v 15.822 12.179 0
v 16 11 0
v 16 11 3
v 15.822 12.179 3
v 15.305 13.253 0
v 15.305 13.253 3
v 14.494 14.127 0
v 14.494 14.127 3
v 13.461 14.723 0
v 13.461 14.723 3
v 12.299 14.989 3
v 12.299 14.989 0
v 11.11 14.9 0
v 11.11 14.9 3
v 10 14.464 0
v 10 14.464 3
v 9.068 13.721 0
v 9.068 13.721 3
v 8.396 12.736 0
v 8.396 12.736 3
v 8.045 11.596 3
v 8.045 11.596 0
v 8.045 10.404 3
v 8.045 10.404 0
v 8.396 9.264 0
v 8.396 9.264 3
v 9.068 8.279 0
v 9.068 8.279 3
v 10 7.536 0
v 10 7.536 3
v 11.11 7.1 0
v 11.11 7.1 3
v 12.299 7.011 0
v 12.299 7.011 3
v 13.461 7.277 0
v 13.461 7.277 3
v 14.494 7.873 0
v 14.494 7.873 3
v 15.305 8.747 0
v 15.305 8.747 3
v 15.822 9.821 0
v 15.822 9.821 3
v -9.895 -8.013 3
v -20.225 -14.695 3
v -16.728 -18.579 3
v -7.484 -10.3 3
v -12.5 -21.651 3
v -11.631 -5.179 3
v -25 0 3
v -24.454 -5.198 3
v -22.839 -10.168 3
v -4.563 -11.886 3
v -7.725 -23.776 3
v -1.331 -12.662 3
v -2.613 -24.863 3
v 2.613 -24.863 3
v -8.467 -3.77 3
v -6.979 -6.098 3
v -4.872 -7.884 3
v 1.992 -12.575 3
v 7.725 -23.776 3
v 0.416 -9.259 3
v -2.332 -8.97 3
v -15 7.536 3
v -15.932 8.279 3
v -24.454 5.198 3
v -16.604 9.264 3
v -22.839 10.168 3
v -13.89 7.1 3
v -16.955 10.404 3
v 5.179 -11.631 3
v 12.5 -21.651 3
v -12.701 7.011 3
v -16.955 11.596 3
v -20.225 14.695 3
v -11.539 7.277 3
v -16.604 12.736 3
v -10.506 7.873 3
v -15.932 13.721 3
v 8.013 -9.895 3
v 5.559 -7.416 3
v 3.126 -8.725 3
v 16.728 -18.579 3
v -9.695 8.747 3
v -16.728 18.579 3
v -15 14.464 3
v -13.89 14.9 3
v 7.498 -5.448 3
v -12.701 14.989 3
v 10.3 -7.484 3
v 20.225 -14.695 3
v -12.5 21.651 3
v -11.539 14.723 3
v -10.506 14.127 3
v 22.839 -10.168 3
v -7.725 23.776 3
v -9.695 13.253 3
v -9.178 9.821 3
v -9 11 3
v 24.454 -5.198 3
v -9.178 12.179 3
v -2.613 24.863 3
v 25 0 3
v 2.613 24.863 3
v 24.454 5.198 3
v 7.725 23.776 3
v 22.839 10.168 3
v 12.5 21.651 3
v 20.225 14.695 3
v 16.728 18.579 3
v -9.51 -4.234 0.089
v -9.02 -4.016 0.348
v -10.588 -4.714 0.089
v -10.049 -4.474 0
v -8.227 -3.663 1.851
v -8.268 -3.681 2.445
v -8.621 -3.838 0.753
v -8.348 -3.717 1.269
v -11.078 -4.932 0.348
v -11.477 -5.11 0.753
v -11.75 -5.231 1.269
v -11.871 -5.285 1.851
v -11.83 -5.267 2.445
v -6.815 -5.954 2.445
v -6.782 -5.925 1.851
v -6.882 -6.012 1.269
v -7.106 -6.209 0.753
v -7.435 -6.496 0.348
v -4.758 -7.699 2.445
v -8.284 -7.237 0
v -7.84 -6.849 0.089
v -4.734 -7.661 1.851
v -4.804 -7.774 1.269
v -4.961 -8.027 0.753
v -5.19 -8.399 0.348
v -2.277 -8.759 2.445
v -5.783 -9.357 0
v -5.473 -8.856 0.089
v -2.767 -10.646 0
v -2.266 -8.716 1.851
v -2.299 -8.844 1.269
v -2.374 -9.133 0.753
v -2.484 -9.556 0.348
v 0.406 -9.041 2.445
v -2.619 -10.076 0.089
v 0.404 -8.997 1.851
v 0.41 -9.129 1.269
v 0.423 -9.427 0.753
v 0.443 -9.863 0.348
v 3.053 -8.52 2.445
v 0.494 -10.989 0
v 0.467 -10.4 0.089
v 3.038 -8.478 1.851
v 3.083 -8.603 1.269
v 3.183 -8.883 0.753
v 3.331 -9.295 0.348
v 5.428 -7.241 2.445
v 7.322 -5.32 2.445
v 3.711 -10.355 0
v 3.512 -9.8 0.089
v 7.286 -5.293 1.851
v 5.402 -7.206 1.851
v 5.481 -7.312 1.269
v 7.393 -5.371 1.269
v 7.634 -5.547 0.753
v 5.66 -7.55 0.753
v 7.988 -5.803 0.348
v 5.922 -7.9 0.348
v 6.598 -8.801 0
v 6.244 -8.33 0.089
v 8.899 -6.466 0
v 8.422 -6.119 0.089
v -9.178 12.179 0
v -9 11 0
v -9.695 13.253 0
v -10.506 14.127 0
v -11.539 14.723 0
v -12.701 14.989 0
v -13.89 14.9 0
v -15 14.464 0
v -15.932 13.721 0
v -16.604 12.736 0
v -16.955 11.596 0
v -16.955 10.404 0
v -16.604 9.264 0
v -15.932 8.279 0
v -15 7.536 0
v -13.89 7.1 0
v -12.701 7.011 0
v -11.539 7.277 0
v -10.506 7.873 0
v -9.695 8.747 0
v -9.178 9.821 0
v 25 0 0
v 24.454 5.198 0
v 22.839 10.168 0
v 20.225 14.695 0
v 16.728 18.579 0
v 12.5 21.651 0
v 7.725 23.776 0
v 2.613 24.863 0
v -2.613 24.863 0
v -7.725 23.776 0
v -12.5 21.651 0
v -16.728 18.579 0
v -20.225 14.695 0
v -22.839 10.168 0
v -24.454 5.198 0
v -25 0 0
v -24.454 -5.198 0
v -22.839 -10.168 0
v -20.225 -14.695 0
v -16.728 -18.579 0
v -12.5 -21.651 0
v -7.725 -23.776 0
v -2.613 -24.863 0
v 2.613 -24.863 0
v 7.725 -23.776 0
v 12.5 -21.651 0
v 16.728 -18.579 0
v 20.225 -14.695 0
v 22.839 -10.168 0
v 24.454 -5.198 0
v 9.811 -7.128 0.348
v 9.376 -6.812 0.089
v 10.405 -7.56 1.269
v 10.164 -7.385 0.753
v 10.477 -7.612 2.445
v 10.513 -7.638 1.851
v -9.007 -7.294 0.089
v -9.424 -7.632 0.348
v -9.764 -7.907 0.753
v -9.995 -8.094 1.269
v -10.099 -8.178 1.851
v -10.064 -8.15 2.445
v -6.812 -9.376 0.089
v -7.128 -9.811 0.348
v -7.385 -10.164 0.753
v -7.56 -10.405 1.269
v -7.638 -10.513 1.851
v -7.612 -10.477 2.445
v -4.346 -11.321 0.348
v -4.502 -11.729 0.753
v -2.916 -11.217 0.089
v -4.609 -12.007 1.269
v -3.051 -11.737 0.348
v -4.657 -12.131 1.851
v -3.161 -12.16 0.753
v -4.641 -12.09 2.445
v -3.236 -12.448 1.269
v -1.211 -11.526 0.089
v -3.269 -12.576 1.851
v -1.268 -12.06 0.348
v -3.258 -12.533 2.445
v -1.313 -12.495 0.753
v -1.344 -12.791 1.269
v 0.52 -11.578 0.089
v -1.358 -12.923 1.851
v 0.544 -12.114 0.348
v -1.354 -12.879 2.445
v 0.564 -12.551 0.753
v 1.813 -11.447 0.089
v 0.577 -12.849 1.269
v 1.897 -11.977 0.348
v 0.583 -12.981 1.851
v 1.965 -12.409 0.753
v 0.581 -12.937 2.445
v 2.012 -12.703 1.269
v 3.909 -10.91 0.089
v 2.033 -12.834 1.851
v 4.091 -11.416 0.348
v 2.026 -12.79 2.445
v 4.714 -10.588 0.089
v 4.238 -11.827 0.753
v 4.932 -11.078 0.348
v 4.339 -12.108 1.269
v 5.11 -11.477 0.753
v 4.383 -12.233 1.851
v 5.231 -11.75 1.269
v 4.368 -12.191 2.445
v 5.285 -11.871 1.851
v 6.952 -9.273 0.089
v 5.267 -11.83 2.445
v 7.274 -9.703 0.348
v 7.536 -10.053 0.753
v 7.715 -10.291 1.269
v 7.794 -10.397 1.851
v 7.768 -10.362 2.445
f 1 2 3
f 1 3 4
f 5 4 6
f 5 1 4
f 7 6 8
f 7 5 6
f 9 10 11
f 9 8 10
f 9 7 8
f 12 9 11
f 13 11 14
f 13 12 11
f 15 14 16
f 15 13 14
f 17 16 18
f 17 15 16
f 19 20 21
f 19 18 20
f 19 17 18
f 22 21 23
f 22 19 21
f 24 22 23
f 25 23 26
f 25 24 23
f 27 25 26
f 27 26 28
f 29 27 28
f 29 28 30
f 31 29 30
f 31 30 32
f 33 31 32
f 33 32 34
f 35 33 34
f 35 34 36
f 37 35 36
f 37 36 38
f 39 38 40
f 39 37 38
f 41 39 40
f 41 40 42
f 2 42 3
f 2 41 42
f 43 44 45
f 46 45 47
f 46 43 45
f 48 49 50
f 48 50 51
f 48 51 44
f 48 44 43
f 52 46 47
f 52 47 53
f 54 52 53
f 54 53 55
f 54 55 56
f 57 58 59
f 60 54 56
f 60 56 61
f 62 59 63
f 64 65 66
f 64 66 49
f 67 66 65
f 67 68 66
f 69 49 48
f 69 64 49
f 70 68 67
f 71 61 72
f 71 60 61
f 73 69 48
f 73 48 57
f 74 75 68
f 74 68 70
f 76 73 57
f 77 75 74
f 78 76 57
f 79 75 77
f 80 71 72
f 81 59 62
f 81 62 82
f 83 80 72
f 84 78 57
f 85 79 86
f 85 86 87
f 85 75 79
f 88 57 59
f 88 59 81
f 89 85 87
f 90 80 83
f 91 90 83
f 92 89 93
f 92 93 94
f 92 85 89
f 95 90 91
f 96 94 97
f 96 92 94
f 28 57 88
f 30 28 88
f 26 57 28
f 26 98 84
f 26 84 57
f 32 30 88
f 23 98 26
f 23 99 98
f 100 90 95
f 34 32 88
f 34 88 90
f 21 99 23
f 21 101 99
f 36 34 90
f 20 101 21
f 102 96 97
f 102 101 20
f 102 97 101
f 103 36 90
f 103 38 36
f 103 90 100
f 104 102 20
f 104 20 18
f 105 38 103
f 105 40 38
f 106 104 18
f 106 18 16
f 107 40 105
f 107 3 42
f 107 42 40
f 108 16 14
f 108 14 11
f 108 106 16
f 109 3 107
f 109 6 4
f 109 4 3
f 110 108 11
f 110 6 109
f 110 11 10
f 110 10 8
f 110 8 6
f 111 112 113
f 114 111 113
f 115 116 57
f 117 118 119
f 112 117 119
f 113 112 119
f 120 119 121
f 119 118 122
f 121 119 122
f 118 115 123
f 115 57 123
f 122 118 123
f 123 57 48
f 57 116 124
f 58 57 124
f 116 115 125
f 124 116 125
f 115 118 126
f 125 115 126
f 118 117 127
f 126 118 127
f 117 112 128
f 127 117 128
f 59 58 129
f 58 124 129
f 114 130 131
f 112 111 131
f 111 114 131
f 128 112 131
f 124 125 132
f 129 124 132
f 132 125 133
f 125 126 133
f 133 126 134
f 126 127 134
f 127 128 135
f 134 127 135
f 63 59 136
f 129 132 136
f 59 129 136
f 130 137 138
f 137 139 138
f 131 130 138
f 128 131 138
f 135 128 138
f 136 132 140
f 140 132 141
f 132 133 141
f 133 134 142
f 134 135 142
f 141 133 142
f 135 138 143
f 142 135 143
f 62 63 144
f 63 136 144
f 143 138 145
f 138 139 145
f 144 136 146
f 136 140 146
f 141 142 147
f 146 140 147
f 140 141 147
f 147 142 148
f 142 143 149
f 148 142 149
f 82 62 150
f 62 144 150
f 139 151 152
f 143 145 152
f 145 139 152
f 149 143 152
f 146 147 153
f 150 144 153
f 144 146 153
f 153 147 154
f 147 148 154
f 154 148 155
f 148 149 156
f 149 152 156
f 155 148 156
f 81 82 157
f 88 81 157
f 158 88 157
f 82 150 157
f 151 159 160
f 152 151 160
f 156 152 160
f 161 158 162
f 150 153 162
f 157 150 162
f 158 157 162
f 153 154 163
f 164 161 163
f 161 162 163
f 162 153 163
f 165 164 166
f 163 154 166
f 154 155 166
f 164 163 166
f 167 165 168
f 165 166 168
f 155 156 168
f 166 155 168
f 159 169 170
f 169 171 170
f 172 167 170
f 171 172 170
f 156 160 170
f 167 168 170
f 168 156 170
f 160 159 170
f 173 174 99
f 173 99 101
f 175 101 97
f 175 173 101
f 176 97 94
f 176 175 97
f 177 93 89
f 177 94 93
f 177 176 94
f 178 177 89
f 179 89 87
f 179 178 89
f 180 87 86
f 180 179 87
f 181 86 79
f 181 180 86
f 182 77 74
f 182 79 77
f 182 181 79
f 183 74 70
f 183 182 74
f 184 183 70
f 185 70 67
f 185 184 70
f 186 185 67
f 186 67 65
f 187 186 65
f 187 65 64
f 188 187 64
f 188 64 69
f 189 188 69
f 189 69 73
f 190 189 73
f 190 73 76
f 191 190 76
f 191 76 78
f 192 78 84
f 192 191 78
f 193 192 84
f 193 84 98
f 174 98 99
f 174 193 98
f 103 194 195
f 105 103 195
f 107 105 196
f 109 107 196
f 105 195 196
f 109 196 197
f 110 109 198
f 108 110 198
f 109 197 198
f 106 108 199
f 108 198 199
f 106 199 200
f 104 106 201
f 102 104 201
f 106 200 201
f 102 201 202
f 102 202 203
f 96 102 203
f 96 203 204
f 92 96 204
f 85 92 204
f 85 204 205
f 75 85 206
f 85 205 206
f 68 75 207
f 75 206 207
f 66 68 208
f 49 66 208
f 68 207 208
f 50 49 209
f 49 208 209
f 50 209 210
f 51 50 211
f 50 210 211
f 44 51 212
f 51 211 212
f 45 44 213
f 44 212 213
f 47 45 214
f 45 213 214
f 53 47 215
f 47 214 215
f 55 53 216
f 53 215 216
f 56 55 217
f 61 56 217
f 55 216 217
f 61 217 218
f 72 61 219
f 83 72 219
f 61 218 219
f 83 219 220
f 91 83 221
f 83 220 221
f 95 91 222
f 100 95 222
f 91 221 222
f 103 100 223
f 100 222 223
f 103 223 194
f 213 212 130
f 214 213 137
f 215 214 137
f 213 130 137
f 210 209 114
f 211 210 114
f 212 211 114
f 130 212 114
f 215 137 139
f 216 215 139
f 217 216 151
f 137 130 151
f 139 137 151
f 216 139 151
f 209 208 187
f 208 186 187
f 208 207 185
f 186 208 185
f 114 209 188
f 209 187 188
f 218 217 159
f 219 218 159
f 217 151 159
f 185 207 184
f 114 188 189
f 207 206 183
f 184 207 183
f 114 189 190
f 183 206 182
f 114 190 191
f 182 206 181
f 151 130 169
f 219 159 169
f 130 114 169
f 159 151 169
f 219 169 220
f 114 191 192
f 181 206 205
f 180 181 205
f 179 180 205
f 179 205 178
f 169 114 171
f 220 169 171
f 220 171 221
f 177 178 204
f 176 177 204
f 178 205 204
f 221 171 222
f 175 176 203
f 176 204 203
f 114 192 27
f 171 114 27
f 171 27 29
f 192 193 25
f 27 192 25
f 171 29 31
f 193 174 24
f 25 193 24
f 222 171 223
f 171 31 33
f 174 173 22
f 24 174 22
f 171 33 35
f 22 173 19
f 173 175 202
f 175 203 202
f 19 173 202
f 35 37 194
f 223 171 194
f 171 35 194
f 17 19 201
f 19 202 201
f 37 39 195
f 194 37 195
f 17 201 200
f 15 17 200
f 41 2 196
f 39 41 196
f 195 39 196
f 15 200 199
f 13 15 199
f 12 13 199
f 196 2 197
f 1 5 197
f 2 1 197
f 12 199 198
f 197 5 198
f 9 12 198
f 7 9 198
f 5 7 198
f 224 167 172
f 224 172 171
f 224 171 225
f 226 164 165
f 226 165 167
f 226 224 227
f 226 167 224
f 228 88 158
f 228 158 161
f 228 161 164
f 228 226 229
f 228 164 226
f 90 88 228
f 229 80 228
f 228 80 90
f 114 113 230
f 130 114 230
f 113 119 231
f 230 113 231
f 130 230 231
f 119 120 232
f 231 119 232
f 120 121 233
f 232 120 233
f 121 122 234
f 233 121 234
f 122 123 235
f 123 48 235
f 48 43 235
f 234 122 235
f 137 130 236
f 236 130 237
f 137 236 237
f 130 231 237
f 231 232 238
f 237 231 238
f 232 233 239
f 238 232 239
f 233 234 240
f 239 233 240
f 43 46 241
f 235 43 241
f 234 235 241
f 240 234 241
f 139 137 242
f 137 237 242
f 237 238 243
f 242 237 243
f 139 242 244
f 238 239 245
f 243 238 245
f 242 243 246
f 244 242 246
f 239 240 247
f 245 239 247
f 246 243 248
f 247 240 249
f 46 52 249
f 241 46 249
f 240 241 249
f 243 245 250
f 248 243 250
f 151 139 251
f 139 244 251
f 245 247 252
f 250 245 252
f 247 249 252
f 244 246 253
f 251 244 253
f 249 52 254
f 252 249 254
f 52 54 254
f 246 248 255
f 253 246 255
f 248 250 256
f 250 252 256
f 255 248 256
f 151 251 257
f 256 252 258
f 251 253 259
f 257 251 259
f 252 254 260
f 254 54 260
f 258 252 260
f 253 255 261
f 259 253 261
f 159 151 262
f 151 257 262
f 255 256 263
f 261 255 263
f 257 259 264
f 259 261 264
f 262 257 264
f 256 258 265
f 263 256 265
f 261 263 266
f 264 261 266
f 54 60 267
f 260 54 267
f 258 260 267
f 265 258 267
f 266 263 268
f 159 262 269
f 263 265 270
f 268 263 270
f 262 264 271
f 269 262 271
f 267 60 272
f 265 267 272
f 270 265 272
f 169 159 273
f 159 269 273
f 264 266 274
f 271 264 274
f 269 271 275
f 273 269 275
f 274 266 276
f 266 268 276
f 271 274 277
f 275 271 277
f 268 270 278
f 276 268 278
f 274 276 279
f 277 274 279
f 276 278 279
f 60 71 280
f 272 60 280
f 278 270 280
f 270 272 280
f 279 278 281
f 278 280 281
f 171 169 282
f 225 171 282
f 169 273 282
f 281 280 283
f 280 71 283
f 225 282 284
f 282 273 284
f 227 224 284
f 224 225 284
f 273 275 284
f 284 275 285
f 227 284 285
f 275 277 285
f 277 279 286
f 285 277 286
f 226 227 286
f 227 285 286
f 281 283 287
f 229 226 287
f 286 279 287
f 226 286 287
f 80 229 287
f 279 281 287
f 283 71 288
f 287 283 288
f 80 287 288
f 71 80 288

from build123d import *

# Parameters (mm, degrees)
TORUS_R               = 2
TORUS_ANGLE           = 120
TORUS_PLACEMENT_ANGLE = 204
CYLINDER002_R         = 4
CYLINDER002_DEPTH     = 10
CYLINDER001_R         = 4
CYLINDER001_DEPTH     = 10
CYLINDER_R            = 25
CYLINDER_DEPTH        = 3


with BuildPart() as toro:
    # Torus → Torus (revolve)
    with BuildSketch(Plane.XZ):
        with Locations((11, 0)):
            Circle(TORUS_R)
    revolve(axis=Axis((0, 0, 0), (0, 0, 1)), revolution_arc=TORUS_ANGLE)


with BuildPart() as toro_1:
    # Torus placement: moved
    add(toro.part.moved(Location((0, 0, 2))).rotate(Axis((0, 0, 2), (0, 0, 1)), TORUS_PLACEMENT_ANGLE))


with BuildPart() as cilindro002:
    # Cylinder002 → Cylinder002 (new body)
    with BuildSketch(Plane(origin=(12, 11, -2), x_dir=(1, 0, 0), z_dir=(0, 0, 1))):
        Circle(CYLINDER002_R)
    extrude(amount=CYLINDER002_DEPTH)


with BuildPart() as fusion:
    # Cylinder001 → Cylinder001 (new body)
    with BuildSketch(Plane(origin=(-13, 11, -2), x_dir=(1, 0, 0), z_dir=(0, 0, 1))):
        Circle(CYLINDER001_R)
    extrude(amount=CYLINDER001_DEPTH)

    # Fusion: union Cilindro002
    add(cilindro002.part)


with BuildPart() as cut001:
    # Cylinder → Cylinder (new body)
    with BuildSketch(Plane.XY):
        Circle(CYLINDER_R)
    extrude(amount=CYLINDER_DEPTH)

    # Cut: cut Fusion
    add(fusion.part, mode=Mode.SUBTRACT)

    # Cut001: cut Toro
    add(toro_1.part, mode=Mode.SUBTRACT)


solid = cut001.part
